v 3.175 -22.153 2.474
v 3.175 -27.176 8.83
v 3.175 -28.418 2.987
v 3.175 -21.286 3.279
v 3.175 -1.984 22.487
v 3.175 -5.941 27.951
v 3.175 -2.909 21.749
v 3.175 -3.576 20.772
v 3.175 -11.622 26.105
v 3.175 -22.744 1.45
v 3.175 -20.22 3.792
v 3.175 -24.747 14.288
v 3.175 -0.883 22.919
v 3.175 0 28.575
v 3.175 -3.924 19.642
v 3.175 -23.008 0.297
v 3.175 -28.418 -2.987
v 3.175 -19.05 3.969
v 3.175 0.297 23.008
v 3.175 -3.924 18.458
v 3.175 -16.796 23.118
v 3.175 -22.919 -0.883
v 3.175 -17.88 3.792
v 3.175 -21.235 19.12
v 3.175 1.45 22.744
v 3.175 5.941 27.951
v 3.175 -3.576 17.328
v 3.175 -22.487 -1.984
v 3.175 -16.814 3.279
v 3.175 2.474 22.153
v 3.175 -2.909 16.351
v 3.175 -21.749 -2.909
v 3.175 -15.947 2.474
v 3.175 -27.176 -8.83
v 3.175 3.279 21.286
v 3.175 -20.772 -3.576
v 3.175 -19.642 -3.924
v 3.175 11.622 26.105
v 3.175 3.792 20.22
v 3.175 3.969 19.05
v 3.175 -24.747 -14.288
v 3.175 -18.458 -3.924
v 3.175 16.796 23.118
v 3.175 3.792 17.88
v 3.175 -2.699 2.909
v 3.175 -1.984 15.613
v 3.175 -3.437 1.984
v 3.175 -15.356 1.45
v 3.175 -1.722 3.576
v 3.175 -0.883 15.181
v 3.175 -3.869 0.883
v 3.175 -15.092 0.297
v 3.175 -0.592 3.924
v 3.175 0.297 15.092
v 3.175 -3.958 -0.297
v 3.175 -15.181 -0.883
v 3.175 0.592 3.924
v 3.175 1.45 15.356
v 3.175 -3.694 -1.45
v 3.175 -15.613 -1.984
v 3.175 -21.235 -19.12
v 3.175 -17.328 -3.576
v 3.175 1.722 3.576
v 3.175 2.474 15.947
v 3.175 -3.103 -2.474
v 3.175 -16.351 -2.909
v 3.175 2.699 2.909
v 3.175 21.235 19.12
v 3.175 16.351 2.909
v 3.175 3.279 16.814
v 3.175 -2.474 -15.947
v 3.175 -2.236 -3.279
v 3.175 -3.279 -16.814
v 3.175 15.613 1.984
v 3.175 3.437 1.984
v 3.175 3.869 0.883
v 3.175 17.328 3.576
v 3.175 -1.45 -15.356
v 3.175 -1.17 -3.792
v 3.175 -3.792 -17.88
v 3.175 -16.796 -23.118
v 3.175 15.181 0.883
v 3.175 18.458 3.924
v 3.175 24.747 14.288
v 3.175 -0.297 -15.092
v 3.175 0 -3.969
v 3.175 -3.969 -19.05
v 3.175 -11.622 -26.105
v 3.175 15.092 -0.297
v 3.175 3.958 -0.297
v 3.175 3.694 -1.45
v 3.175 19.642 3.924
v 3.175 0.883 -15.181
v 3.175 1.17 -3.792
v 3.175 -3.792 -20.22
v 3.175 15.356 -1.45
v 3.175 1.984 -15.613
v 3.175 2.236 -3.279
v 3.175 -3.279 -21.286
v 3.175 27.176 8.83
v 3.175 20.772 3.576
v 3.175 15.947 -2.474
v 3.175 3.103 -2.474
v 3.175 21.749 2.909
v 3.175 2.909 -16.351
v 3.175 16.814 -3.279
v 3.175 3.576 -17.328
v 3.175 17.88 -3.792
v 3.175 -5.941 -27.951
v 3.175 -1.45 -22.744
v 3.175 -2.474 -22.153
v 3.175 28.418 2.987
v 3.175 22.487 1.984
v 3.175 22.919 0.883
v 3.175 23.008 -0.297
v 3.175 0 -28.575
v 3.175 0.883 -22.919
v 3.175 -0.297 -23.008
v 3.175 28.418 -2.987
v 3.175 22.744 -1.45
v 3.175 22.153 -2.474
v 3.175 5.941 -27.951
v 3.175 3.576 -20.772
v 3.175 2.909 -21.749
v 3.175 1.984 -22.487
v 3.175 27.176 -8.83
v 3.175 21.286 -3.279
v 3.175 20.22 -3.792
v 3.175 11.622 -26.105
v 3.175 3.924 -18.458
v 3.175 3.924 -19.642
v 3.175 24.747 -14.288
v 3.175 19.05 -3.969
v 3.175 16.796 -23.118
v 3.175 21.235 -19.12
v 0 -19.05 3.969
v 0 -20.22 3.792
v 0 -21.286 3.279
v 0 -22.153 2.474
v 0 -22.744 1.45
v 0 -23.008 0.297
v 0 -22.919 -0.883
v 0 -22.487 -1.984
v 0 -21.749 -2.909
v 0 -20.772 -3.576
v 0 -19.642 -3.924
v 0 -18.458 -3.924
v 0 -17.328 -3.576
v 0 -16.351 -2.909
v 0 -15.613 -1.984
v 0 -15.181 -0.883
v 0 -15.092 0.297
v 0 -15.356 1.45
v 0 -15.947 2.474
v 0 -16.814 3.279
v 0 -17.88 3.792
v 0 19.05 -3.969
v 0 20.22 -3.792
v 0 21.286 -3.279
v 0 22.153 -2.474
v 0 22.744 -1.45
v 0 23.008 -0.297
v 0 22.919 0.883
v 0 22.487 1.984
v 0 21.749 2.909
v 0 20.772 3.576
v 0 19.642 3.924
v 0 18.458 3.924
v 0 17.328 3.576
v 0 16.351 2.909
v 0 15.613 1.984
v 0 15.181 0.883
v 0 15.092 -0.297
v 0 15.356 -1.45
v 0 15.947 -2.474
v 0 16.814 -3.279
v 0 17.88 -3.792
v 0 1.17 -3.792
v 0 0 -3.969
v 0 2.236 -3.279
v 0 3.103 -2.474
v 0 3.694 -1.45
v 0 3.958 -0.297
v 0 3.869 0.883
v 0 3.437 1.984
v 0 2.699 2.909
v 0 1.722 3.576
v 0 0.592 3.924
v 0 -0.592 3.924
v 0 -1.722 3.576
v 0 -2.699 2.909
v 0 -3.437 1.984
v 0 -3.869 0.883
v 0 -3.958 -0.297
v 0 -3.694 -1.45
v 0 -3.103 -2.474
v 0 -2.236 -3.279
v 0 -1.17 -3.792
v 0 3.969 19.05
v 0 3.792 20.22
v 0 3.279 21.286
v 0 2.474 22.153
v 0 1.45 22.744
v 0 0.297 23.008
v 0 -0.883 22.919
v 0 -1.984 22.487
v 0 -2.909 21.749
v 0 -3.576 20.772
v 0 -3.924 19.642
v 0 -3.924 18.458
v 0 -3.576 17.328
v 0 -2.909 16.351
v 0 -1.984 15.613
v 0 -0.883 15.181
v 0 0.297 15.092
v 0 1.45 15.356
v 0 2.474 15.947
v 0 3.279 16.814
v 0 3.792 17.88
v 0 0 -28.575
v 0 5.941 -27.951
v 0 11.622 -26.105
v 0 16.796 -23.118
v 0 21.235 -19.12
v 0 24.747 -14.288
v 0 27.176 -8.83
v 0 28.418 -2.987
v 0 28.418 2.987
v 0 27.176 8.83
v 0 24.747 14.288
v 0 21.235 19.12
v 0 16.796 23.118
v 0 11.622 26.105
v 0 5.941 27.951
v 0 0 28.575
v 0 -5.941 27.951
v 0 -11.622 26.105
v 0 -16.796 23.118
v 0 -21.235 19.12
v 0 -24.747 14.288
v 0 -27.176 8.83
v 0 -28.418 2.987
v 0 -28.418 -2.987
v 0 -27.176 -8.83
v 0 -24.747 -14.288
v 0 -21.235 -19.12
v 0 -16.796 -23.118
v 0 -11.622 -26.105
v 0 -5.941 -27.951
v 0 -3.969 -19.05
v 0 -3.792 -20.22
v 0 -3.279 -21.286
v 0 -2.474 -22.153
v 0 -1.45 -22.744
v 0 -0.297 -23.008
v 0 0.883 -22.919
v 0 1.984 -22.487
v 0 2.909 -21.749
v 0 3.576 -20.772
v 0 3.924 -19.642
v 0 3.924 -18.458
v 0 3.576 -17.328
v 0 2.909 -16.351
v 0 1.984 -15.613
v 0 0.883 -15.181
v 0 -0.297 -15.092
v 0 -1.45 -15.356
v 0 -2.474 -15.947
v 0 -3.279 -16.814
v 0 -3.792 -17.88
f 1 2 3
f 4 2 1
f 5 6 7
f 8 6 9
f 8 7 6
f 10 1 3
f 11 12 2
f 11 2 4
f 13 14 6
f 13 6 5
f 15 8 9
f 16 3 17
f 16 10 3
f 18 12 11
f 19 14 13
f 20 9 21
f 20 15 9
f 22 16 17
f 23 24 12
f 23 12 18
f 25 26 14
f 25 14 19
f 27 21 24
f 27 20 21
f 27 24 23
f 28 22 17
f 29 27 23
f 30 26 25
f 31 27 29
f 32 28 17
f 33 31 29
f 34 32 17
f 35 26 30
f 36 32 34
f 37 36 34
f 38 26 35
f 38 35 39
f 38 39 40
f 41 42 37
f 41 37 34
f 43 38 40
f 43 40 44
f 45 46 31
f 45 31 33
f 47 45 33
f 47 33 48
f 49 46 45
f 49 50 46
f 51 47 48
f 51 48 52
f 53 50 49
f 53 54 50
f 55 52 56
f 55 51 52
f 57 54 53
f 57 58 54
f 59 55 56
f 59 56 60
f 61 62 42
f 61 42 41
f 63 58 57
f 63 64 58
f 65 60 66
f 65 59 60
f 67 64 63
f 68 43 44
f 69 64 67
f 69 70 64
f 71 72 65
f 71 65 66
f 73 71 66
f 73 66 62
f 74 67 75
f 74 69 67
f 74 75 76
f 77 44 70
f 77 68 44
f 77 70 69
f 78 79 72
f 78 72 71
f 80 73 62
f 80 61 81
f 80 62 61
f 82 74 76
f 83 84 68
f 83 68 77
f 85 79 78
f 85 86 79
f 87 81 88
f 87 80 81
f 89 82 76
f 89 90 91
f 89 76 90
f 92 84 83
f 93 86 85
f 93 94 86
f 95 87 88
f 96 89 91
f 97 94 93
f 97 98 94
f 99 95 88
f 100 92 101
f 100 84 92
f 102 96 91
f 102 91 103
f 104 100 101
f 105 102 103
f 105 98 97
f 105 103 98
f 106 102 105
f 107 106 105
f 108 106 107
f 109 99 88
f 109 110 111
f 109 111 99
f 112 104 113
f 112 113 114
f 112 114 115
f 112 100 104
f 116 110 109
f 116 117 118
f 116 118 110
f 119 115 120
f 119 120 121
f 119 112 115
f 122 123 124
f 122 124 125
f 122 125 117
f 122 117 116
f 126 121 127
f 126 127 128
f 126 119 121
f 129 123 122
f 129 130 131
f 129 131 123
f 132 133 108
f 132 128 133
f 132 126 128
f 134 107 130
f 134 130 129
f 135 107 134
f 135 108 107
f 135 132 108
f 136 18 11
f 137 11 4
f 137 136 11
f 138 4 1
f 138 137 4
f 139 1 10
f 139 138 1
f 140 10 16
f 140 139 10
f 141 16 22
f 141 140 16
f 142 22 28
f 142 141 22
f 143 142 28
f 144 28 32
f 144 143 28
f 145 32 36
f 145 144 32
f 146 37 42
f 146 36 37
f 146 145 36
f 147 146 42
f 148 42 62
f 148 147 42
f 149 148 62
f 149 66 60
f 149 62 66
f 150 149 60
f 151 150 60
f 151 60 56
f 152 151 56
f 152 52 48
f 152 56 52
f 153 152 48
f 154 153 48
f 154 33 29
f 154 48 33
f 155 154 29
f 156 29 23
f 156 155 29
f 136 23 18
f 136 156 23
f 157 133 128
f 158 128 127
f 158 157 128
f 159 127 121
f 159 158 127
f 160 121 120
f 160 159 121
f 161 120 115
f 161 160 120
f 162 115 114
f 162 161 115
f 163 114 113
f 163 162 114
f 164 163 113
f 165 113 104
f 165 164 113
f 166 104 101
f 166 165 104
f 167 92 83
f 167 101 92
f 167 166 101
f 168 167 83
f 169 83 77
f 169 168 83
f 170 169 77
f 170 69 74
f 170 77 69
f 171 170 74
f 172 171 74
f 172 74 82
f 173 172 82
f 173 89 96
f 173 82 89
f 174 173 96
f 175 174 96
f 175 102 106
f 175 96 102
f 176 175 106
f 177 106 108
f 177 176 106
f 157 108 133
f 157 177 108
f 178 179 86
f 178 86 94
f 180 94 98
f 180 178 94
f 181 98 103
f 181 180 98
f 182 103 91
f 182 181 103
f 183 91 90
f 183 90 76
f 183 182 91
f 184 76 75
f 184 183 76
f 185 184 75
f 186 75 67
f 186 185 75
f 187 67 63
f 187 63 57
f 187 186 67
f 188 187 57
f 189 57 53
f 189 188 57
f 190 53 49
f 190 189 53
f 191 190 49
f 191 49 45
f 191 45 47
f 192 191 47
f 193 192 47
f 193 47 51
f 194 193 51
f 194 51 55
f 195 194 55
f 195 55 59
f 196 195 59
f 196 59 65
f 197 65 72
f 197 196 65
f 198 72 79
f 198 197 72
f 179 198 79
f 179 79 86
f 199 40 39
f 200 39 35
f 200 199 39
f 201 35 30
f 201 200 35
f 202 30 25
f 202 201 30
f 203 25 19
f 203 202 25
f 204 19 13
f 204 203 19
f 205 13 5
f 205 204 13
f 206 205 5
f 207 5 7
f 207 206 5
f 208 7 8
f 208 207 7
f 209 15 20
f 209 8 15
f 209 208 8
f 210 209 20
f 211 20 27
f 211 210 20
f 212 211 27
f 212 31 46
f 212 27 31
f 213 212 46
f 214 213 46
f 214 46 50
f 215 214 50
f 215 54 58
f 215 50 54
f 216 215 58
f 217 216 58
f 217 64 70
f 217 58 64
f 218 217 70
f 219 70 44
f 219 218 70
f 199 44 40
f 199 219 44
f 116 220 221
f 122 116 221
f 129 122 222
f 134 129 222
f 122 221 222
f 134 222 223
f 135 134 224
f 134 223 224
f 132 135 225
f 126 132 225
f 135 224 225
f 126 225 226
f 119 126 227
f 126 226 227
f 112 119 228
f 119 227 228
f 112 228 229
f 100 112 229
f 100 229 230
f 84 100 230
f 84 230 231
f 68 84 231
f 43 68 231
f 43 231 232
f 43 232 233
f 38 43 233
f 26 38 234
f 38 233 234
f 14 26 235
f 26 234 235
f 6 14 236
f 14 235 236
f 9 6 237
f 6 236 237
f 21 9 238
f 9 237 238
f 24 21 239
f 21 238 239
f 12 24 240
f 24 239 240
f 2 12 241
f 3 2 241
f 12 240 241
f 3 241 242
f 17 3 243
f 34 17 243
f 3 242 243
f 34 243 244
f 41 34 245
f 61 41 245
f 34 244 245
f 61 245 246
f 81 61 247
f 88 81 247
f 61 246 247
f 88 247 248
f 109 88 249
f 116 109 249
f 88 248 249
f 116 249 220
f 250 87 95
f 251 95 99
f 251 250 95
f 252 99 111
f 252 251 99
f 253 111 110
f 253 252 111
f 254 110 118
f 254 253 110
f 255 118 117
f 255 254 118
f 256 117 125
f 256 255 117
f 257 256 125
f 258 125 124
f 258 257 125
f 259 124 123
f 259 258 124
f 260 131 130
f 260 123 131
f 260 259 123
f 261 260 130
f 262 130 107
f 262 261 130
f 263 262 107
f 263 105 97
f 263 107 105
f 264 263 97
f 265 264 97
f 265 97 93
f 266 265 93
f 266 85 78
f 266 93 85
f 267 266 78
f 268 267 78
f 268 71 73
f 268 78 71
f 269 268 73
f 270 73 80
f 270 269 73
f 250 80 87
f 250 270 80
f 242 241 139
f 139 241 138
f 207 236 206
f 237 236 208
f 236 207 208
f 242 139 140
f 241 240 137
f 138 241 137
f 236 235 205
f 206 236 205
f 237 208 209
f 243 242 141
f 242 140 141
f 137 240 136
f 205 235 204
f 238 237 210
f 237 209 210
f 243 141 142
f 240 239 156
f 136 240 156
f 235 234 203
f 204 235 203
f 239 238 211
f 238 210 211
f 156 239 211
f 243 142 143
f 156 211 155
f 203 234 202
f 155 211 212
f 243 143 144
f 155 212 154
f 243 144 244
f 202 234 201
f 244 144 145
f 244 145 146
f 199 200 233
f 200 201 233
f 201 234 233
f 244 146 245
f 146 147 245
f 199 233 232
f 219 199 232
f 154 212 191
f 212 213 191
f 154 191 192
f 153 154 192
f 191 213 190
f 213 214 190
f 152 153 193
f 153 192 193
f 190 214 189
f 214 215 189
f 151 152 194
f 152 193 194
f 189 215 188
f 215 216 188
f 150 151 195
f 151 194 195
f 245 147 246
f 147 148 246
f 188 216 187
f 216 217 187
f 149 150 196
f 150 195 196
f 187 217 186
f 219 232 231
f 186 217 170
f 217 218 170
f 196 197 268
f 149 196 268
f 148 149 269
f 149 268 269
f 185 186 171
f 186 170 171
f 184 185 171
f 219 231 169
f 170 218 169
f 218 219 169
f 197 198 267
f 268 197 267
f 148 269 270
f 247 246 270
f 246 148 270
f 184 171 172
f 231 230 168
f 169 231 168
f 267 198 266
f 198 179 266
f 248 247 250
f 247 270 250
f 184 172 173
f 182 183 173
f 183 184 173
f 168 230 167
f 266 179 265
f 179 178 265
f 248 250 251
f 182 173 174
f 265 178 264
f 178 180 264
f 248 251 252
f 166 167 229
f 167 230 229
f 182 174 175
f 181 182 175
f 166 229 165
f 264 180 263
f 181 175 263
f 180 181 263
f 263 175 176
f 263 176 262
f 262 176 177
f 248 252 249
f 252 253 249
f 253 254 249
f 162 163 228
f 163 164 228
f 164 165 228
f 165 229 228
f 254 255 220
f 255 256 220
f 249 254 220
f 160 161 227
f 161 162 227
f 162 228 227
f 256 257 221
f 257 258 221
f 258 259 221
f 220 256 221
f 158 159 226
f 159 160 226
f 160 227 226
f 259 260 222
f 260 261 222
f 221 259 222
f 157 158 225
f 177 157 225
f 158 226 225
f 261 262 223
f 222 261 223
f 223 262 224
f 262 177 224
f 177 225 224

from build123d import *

# Parameters (mm, degrees)
SKETCH1_R           = 28.575
SKETCH1_R_2         = 3.96875
BOSS_EXTRUDE1_DEPTH = 3.175
SKETCH2_R           = 3.96875
CUT_EXTRUDE1_DEPTH  = 41.535686438
CIRPATTERN1_COUNT   = 4


with BuildPart() as part:
    # Sketch1 → Boss-Extrude1 (new body)
    with BuildSketch(Plane(origin=(0, 0, 0), x_dir=(0, 0, -1), z_dir=(1, 0, 0))):
        Circle(SKETCH1_R)
        Circle(SKETCH1_R_2, mode=Mode.SUBTRACT)
    extrude(amount=BOSS_EXTRUDE1_DEPTH)

    # Sketch2 → Cut-Extrude1 (cut, through all)
    with BuildSketch(Plane(origin=(0, 0, 0), x_dir=(0, 0, -1), z_dir=(1, 0, 0))):
        with Locations((0, 19.05)):
            Circle(SKETCH2_R)
    cut_extrude1 = extrude(amount=CUT_EXTRUDE1_DEPTH, mode=Mode.SUBTRACT)

    # CirPattern1: Cut-Extrude1 ×4 about axis
    cirpattern1_axis = Axis((0, 0, 0), (1, 0, 0))
    for i in range(1, CIRPATTERN1_COUNT):
        add(cut_extrude1.rotate(cirpattern1_axis, i * 360 / CIRPATTERN1_COUNT), mode=Mode.SUBTRACT)


solid = part.part
